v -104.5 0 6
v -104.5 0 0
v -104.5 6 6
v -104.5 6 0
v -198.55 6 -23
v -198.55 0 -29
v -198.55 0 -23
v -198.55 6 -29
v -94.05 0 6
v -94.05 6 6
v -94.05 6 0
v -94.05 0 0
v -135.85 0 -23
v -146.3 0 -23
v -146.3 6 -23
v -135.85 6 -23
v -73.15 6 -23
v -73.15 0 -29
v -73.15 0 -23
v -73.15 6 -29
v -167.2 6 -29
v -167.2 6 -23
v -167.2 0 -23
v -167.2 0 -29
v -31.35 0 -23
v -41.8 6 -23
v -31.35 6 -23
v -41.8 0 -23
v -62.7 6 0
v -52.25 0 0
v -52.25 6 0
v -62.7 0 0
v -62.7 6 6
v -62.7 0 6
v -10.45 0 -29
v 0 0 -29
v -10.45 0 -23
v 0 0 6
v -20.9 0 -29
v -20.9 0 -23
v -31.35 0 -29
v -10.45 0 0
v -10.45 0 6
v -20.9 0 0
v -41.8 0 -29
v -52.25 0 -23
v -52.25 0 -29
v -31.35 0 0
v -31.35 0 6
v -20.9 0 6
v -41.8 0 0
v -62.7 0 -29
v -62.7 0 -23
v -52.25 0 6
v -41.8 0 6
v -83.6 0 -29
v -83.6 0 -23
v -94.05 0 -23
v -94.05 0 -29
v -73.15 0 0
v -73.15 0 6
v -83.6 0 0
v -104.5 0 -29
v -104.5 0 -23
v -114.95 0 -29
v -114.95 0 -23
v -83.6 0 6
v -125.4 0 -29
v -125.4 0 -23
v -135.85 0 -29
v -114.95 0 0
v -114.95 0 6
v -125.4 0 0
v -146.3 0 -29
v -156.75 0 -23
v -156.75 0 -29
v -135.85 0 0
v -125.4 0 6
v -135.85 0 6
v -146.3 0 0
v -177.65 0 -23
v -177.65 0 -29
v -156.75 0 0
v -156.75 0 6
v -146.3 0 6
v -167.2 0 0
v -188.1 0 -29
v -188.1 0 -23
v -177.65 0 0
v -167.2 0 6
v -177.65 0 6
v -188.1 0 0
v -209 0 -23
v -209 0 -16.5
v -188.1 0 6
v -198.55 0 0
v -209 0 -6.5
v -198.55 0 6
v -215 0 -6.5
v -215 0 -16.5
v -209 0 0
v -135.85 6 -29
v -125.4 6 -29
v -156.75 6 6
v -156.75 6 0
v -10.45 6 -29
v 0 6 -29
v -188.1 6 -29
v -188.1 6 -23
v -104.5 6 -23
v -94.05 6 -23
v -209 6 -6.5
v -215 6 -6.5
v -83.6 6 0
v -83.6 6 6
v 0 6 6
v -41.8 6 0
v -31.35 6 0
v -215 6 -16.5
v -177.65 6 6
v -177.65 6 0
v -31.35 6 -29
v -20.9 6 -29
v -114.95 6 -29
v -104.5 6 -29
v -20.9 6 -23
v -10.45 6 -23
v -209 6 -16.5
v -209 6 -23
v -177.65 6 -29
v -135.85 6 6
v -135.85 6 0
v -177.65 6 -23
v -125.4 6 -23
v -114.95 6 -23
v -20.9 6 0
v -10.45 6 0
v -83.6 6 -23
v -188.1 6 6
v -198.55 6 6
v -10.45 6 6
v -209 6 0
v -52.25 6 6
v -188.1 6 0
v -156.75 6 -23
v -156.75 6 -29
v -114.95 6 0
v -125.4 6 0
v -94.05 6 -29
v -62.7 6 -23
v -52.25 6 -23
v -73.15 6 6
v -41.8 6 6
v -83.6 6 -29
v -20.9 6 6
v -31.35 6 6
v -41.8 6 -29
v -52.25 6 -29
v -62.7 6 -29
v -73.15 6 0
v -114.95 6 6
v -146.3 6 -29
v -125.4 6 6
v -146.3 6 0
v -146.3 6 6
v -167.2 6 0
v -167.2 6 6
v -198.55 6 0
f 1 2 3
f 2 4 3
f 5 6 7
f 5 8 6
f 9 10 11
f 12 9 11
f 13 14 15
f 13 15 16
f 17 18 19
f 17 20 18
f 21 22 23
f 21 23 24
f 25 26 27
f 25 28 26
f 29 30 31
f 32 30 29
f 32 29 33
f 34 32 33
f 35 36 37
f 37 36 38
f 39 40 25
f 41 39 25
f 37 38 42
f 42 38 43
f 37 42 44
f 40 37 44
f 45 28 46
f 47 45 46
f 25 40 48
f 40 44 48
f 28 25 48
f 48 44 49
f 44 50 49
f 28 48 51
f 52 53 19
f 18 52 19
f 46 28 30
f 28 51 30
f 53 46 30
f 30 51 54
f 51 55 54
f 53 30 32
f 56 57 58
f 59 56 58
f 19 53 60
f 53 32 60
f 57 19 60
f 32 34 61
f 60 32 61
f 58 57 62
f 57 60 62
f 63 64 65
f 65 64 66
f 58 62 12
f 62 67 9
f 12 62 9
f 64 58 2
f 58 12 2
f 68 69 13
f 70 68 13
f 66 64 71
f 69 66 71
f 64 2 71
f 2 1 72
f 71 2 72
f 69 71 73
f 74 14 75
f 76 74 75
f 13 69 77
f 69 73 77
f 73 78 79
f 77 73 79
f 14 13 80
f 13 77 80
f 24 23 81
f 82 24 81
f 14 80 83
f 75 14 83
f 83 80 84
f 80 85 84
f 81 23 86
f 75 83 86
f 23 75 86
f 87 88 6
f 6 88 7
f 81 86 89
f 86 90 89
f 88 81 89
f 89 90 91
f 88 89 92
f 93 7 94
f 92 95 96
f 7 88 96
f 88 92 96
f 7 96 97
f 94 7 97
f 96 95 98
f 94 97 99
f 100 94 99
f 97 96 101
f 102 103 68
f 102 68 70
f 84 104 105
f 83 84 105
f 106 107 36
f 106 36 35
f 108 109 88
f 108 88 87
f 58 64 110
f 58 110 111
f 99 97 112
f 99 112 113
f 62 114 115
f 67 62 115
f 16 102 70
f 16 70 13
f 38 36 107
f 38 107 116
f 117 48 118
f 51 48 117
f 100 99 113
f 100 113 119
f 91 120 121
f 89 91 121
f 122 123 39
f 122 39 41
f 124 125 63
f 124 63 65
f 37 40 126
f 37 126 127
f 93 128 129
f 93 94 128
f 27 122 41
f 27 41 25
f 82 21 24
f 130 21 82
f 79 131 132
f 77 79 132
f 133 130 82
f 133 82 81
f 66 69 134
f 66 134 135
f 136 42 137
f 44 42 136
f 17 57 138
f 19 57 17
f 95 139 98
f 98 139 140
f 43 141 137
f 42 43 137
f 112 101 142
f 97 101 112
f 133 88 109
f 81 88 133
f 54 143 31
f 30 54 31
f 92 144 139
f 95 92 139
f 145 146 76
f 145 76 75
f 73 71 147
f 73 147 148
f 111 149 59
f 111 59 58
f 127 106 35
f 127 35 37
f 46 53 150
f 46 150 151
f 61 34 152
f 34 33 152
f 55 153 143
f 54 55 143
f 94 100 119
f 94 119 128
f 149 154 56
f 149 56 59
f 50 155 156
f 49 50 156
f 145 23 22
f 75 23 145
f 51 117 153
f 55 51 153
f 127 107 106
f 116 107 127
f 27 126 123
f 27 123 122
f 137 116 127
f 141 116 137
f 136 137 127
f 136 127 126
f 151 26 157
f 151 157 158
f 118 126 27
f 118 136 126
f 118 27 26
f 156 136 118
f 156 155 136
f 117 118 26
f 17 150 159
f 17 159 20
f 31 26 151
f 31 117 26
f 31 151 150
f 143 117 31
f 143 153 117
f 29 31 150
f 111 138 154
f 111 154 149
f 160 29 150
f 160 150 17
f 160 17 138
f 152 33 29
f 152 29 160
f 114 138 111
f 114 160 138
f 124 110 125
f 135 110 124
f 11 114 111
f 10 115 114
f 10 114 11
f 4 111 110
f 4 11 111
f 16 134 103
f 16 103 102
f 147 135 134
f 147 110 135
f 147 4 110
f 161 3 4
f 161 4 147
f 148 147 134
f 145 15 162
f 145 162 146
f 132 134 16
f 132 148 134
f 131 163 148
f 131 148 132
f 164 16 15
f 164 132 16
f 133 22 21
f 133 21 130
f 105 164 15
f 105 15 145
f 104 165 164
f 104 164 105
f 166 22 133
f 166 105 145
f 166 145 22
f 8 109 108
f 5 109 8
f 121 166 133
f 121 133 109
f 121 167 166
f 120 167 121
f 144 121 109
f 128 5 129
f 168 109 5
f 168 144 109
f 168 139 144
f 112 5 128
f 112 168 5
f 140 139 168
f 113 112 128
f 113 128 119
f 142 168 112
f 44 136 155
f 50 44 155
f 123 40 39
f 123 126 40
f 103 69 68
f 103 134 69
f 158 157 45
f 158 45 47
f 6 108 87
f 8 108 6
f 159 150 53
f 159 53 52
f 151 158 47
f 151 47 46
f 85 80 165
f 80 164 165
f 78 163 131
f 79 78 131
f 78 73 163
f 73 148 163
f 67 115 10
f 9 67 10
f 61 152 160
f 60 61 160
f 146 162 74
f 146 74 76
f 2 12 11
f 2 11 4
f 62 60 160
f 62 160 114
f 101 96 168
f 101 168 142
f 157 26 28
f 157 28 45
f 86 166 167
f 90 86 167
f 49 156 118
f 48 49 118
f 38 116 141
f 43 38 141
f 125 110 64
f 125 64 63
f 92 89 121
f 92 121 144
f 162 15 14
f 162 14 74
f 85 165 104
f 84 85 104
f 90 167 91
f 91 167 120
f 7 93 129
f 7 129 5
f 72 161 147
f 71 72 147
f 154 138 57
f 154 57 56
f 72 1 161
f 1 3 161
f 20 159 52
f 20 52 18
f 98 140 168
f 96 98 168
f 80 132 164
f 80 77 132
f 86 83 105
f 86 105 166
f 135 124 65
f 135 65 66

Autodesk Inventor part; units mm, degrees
ref_plane "YZ Plane" through (0, 0, 0) normal (1, 0, 0) x (0, 1, 0)
ref_plane "XZ Plane" through (0, 0, 0) normal (0, 1, 0) x (-1, 0, 0)
ref_plane "XY Plane" through (0, 0, 0) normal (0, 0, 1) x (1, 0, 0)
sketch "Sketch1" plane through (0, 0, 0) normal (0, 1, 0) x (-1, 0, 0)
  line L0 (0, 0) -> (209, 0)
  line L1 (209, -23) -> (0, -23)
  line L2 (0, -23) -> (0, 0)
  line L3 (209, -6.5) -> (215, -6.5)
  line L4 (215, -6.5) -> (215, -16.5)
  line L5 (215, -16.5) -> (209, -16.5)
  line L6 (209, 0) -> (209, -6.5)
  line L7 (209, -16.5) -> (209, -23)
  dimension "d0" = 209
  dimension "d1" = 23
  dimension "d3" = 6
  dimension "d4" = 10
extrude "Extrusion1" add sketch "Sketch1" along normal blind 6
sketch "Sketch2" plane through (0, 6, 0) normal (0, 1, 0) x (1, 0, 0)
  line L0 (-209, 0) -> (0, 0) projected
  line L1 (-209, 0) -> (-198.55, 0)
  line L2 (-198.55, 0) -> (-188.1, 0)
  line L3 (-188.1, 0) -> (-188.1, -6)
  line L4 (-188.1, -6) -> (-198.55, -6)
  line L5 (-198.55, -6) -> (-198.55, 0)
  line L6 (-209, 23) -> (-209, 16.5) projected
  line L7 (0, 23) -> (-209, 23) projected
  line L8 (-198.55, 23) -> (-188.1, 23)
  line L9 (-188.1, 23) -> (-188.1, 29)
  line L10 (-188.1, 29) -> (-198.55, 29)
  line L11 (-198.55, 29) -> (-198.55, 23)
  dimension "d7" = 10.45
  dimension "d8" = 10.45
  dimension "d9" = 6
  dimension "d10" = 10.45
  dimension "d11" = 10.45
  dimension "d12" = 6
extrude "Extrusion2" add sketch "Sketch2" against normal blind 6
pattern_linear "Rectangular Pattern1" count 10 spacing 20.9 along (1, 0, 0) of "Extrusion2"
properties part number "g_arm 4"
